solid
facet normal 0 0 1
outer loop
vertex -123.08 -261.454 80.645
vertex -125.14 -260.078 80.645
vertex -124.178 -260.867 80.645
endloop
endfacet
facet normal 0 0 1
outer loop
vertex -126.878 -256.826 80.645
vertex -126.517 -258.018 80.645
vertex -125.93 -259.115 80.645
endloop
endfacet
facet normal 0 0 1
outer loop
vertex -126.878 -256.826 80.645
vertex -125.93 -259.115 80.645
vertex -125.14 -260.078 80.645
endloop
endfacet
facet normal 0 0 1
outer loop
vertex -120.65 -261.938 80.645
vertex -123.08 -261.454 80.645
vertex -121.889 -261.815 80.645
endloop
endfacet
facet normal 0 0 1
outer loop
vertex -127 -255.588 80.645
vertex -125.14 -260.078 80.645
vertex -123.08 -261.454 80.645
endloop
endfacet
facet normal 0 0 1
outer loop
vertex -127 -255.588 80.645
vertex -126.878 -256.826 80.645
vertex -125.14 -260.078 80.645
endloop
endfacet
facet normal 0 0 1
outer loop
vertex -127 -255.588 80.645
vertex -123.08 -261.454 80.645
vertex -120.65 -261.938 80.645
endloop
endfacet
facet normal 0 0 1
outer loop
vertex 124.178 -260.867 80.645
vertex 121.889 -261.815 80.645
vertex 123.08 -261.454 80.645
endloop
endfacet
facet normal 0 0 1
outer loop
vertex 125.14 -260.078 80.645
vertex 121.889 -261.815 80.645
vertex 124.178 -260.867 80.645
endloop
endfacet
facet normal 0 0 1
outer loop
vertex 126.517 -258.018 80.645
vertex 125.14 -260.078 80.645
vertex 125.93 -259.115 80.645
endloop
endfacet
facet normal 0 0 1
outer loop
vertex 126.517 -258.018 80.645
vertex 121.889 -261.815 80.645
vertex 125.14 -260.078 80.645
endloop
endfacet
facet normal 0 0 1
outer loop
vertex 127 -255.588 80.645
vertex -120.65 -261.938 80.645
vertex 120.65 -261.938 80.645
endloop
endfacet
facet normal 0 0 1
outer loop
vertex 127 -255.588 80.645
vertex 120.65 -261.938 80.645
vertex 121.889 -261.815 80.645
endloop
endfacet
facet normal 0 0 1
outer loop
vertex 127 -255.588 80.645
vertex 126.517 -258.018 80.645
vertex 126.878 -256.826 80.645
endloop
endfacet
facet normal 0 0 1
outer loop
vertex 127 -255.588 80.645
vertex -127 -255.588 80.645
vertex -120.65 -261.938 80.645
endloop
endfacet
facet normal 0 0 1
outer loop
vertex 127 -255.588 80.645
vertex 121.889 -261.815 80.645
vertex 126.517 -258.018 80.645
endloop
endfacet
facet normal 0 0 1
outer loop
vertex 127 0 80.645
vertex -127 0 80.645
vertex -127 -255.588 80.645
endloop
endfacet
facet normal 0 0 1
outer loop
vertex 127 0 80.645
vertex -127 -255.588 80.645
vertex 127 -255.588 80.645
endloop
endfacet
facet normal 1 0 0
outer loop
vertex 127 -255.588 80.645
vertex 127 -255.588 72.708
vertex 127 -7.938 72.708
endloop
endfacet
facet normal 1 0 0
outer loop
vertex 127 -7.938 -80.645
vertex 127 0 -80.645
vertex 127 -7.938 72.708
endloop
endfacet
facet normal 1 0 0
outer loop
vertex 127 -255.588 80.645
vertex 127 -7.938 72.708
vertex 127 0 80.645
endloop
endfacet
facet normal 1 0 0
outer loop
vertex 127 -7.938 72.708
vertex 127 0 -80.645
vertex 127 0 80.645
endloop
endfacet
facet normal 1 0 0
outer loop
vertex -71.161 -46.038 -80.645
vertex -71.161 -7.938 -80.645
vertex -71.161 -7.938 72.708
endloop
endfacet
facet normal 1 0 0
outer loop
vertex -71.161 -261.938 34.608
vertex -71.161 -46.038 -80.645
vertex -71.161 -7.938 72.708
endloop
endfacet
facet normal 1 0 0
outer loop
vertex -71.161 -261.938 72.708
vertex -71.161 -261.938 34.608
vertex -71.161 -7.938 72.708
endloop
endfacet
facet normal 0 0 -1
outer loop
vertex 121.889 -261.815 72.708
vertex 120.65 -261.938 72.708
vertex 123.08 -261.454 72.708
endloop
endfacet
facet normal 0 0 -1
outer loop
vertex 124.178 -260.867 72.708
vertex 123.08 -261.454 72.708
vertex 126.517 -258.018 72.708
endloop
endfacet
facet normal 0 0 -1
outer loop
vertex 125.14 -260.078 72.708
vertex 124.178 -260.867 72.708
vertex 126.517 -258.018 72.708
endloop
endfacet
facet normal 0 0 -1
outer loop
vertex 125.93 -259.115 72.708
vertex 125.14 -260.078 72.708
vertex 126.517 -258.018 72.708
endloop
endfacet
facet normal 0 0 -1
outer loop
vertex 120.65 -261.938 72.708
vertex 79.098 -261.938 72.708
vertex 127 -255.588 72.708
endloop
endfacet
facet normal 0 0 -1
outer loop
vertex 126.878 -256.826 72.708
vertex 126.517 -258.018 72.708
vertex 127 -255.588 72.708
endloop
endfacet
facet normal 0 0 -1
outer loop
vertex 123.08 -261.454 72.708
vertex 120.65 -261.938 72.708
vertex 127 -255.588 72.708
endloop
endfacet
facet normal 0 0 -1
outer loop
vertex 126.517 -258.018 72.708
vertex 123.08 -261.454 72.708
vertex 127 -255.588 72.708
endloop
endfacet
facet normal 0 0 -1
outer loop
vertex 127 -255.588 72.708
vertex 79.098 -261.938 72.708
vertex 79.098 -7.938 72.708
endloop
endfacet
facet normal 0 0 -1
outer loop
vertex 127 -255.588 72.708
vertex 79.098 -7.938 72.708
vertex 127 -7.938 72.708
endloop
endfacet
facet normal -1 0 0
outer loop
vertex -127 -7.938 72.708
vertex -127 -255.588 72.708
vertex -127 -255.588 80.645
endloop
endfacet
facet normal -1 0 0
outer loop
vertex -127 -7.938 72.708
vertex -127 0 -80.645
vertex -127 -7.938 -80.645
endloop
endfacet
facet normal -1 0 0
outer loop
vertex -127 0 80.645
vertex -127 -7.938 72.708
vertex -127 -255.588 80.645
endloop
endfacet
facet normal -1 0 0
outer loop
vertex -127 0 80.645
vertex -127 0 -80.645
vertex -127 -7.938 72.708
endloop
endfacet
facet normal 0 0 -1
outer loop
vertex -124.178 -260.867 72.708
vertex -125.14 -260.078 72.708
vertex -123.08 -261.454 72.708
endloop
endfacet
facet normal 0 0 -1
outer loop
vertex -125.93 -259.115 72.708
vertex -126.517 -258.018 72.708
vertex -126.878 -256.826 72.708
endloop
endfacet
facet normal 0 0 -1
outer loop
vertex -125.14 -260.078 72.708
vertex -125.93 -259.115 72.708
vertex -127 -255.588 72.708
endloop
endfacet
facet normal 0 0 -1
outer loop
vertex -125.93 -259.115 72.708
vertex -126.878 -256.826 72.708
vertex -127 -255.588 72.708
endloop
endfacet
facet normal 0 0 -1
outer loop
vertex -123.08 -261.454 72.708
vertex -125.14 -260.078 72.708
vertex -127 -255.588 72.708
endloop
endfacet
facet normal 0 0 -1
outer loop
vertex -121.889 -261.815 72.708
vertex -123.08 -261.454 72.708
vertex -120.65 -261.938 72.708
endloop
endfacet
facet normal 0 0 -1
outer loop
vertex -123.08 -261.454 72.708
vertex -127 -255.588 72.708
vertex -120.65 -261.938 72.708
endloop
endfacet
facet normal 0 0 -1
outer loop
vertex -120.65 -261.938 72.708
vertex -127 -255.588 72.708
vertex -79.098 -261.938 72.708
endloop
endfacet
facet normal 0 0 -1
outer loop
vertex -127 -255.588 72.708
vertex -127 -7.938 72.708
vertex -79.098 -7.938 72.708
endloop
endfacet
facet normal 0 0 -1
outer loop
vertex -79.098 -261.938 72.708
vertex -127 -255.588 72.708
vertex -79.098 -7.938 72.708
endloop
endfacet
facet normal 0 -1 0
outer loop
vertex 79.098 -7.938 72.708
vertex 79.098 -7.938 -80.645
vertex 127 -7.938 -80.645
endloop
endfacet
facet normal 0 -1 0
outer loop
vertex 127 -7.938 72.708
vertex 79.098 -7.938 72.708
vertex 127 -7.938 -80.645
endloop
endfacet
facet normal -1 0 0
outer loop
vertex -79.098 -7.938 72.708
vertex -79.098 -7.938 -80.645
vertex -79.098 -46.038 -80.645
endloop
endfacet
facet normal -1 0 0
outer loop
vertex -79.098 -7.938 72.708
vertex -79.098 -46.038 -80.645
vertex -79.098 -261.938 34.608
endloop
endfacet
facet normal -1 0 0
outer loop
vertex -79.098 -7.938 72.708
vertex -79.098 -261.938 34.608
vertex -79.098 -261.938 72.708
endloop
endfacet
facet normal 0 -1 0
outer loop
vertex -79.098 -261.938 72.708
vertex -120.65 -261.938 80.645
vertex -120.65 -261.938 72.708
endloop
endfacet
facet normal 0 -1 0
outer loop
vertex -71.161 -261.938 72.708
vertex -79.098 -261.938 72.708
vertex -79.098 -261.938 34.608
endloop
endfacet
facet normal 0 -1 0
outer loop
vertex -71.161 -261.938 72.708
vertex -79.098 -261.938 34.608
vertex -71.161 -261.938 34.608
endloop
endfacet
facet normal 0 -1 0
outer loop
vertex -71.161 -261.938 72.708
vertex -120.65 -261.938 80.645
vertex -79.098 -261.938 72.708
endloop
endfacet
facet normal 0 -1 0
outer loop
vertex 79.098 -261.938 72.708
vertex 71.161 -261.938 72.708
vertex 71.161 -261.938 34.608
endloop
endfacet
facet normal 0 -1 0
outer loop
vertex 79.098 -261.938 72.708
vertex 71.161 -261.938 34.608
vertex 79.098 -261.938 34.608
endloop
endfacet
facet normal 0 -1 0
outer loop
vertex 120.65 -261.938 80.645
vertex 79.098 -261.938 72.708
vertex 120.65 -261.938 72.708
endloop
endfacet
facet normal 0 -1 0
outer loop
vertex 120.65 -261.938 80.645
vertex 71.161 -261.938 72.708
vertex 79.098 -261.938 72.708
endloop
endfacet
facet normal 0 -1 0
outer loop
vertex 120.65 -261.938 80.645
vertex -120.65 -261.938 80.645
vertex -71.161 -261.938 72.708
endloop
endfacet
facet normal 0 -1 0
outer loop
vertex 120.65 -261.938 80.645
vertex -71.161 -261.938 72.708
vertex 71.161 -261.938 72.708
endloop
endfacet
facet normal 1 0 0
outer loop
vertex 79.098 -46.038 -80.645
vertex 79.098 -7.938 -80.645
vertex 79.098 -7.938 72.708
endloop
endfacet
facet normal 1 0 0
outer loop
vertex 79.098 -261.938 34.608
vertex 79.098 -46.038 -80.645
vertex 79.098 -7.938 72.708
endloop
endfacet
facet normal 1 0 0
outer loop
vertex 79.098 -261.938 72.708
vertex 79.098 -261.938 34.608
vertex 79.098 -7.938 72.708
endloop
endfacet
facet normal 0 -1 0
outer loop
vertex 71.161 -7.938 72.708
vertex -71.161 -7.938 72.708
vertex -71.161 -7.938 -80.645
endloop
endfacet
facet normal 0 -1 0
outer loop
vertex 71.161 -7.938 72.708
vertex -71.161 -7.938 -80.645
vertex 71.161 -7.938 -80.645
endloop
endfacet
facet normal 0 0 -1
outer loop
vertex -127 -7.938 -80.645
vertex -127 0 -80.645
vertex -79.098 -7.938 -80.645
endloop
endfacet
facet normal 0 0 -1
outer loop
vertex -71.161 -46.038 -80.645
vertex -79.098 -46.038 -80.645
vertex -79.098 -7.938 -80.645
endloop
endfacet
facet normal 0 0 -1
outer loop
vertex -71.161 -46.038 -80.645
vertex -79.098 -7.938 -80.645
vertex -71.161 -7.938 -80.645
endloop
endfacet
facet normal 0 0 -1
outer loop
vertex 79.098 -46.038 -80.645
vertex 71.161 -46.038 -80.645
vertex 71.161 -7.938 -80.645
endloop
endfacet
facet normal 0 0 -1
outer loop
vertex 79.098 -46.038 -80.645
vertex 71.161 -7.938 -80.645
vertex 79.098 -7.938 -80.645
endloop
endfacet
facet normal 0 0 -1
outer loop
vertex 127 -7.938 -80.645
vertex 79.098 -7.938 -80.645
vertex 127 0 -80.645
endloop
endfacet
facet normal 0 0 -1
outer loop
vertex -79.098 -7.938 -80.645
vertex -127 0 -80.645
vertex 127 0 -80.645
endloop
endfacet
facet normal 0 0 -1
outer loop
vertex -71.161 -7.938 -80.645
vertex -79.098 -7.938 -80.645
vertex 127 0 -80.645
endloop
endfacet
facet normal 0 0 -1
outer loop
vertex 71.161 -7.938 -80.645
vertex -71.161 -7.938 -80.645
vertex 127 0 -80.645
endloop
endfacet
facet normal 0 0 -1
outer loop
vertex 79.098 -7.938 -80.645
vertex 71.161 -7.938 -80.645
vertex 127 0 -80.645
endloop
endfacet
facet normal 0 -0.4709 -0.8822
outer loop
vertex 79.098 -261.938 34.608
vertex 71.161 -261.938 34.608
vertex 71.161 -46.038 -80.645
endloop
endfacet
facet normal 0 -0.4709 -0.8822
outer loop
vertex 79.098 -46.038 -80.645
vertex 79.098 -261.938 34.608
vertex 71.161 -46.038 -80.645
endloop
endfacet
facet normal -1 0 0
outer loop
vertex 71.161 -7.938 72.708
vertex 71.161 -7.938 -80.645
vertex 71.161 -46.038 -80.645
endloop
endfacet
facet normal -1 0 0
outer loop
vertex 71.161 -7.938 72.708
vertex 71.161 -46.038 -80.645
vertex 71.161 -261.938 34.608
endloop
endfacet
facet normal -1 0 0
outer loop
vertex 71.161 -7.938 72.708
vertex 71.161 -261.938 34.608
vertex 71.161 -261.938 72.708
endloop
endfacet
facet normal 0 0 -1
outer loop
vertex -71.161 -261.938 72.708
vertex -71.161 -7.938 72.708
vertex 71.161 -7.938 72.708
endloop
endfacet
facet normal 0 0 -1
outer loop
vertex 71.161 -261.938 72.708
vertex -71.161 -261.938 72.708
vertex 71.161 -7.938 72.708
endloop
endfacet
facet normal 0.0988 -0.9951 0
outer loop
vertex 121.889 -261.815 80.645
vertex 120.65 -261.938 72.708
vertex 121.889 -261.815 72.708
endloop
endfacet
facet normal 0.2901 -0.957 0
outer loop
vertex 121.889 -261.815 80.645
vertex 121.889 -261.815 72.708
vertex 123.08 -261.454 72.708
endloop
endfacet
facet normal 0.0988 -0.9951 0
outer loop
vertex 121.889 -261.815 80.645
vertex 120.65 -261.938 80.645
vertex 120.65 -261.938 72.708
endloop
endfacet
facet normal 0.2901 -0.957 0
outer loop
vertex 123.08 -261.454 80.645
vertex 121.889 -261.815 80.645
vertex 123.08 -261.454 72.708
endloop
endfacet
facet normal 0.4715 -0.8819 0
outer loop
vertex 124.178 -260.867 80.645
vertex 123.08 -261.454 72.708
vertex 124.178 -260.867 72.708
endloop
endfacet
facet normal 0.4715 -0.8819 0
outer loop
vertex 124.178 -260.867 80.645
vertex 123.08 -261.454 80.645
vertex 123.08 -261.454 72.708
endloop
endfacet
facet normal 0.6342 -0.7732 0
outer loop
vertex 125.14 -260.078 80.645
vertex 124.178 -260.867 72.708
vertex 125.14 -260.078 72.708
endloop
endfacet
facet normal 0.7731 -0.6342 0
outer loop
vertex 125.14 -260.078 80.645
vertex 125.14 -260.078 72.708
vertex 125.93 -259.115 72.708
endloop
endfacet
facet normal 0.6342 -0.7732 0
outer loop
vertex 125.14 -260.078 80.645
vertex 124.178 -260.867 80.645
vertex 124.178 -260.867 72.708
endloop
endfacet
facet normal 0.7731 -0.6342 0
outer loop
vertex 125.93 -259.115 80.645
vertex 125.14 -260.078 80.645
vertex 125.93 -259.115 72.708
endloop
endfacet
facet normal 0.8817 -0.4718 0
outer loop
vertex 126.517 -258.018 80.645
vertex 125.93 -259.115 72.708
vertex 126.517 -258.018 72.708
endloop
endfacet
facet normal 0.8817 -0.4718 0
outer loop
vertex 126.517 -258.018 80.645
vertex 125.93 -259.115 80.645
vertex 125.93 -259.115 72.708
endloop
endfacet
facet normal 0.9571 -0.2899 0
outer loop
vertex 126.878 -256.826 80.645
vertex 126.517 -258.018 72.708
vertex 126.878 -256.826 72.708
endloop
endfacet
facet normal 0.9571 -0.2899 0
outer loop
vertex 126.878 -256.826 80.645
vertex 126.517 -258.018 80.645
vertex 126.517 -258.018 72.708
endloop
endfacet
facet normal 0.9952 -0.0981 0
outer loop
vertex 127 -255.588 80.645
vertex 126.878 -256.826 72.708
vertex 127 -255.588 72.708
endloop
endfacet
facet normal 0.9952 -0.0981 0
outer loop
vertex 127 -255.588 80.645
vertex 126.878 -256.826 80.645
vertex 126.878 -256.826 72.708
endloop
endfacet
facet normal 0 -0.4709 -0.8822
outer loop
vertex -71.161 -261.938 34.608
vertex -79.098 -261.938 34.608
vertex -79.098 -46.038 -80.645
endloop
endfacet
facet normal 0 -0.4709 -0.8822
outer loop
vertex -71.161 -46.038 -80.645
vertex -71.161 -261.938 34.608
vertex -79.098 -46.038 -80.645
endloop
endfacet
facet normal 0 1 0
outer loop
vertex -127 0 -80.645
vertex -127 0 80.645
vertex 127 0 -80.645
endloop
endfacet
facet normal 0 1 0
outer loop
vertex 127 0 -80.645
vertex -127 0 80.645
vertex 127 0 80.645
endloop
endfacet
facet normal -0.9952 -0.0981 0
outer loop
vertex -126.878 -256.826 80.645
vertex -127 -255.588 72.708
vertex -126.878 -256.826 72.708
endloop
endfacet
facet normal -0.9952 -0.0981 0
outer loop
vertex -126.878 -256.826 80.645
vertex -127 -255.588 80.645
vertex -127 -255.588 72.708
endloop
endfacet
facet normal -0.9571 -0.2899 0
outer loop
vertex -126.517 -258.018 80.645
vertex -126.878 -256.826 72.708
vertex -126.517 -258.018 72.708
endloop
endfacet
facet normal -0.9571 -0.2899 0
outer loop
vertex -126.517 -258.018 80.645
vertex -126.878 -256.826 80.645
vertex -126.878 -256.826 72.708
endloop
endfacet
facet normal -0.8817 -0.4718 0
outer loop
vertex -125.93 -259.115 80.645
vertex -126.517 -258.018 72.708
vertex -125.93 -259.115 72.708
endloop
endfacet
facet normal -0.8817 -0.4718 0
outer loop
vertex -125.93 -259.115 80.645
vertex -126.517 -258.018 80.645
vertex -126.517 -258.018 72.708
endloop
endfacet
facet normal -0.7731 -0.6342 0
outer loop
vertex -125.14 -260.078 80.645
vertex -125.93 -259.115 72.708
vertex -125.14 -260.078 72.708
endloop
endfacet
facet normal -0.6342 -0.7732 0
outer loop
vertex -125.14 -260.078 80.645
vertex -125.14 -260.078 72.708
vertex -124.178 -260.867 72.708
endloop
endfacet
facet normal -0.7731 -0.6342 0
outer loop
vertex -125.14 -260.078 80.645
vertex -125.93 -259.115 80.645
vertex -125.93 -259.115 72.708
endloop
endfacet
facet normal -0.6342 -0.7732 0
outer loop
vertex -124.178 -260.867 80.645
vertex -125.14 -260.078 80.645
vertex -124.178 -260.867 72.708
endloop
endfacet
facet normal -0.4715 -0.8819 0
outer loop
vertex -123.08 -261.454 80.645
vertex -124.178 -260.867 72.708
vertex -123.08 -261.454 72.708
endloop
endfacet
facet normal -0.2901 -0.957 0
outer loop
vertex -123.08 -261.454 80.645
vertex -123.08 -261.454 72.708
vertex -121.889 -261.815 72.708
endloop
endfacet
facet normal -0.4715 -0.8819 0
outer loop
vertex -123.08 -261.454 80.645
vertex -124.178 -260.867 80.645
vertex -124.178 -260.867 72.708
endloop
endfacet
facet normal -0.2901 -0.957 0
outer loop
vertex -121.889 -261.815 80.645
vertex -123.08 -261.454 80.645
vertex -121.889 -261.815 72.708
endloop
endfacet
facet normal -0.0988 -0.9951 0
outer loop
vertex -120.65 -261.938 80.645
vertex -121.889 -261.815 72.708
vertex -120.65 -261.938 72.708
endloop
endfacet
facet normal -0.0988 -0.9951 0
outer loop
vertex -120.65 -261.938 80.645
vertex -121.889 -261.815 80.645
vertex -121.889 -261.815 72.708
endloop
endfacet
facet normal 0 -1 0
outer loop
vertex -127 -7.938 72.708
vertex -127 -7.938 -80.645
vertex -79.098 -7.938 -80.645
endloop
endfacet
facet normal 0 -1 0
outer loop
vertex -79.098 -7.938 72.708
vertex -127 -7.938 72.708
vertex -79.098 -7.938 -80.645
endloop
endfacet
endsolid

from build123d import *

# Parameters (mm, degrees)
F0_W     = 254
F0_H     = 161.29
F1_DEPTH = 7.9375
F2_W     = 254
F2_H     = 7.9375
F3_DEPTH = 254
F6_W     = 7.9375
F6_H     = 153.3525
F7_DEPTH = 254
F9_DEPTH = 206.09914
F10_R    = 6.35


with BuildPart() as f1:
    # F0 (on Front) → F1 (new body)
    with BuildSketch(Plane.XZ):
        Rectangle(F0_W, F0_H)
    extrude(amount=F1_DEPTH)

    # F2 (on face) → F3 (join)
    with BuildSketch(Plane.XZ.offset(7.9375)):
        with Locations((0, 76.67625)):
            Rectangle(F2_W, F2_H)
    extrude(amount=F3_DEPTH)

    # F6 (on face) → F7 (join, through all)
    with BuildSketch(Plane.XZ.offset(7.9375)):
        with Locations((-75.12939, -3.96875)):
            Rectangle(F6_W, F6_H)
        with Locations((75.12939, -3.96875)):
            Rectangle(F6_W, F6_H)
    extrude(amount=F7_DEPTH)

    # F8 (on face) → F9 (cut, through all)
    with BuildSketch(Plane(origin=(-79.09814, 0, 0), x_dir=(0, -1, 0), z_dir=(-1, 0, 0))):
        Polygon((261.9375, -80.645), (261.9375, 34.6075), (46.0375, -80.645), align=None)
    extrude(amount=-F9_DEPTH, mode=Mode.SUBTRACT)

    # F10
    f10_edges = [f1.edges().sort_by_distance(p)[0] for p in [
        (-127, -261.9375, 76.67625),
        (127, -261.9375, 76.67625),
    ]]
    fillet(f10_edges, radius=F10_R)


solid = f1.part
